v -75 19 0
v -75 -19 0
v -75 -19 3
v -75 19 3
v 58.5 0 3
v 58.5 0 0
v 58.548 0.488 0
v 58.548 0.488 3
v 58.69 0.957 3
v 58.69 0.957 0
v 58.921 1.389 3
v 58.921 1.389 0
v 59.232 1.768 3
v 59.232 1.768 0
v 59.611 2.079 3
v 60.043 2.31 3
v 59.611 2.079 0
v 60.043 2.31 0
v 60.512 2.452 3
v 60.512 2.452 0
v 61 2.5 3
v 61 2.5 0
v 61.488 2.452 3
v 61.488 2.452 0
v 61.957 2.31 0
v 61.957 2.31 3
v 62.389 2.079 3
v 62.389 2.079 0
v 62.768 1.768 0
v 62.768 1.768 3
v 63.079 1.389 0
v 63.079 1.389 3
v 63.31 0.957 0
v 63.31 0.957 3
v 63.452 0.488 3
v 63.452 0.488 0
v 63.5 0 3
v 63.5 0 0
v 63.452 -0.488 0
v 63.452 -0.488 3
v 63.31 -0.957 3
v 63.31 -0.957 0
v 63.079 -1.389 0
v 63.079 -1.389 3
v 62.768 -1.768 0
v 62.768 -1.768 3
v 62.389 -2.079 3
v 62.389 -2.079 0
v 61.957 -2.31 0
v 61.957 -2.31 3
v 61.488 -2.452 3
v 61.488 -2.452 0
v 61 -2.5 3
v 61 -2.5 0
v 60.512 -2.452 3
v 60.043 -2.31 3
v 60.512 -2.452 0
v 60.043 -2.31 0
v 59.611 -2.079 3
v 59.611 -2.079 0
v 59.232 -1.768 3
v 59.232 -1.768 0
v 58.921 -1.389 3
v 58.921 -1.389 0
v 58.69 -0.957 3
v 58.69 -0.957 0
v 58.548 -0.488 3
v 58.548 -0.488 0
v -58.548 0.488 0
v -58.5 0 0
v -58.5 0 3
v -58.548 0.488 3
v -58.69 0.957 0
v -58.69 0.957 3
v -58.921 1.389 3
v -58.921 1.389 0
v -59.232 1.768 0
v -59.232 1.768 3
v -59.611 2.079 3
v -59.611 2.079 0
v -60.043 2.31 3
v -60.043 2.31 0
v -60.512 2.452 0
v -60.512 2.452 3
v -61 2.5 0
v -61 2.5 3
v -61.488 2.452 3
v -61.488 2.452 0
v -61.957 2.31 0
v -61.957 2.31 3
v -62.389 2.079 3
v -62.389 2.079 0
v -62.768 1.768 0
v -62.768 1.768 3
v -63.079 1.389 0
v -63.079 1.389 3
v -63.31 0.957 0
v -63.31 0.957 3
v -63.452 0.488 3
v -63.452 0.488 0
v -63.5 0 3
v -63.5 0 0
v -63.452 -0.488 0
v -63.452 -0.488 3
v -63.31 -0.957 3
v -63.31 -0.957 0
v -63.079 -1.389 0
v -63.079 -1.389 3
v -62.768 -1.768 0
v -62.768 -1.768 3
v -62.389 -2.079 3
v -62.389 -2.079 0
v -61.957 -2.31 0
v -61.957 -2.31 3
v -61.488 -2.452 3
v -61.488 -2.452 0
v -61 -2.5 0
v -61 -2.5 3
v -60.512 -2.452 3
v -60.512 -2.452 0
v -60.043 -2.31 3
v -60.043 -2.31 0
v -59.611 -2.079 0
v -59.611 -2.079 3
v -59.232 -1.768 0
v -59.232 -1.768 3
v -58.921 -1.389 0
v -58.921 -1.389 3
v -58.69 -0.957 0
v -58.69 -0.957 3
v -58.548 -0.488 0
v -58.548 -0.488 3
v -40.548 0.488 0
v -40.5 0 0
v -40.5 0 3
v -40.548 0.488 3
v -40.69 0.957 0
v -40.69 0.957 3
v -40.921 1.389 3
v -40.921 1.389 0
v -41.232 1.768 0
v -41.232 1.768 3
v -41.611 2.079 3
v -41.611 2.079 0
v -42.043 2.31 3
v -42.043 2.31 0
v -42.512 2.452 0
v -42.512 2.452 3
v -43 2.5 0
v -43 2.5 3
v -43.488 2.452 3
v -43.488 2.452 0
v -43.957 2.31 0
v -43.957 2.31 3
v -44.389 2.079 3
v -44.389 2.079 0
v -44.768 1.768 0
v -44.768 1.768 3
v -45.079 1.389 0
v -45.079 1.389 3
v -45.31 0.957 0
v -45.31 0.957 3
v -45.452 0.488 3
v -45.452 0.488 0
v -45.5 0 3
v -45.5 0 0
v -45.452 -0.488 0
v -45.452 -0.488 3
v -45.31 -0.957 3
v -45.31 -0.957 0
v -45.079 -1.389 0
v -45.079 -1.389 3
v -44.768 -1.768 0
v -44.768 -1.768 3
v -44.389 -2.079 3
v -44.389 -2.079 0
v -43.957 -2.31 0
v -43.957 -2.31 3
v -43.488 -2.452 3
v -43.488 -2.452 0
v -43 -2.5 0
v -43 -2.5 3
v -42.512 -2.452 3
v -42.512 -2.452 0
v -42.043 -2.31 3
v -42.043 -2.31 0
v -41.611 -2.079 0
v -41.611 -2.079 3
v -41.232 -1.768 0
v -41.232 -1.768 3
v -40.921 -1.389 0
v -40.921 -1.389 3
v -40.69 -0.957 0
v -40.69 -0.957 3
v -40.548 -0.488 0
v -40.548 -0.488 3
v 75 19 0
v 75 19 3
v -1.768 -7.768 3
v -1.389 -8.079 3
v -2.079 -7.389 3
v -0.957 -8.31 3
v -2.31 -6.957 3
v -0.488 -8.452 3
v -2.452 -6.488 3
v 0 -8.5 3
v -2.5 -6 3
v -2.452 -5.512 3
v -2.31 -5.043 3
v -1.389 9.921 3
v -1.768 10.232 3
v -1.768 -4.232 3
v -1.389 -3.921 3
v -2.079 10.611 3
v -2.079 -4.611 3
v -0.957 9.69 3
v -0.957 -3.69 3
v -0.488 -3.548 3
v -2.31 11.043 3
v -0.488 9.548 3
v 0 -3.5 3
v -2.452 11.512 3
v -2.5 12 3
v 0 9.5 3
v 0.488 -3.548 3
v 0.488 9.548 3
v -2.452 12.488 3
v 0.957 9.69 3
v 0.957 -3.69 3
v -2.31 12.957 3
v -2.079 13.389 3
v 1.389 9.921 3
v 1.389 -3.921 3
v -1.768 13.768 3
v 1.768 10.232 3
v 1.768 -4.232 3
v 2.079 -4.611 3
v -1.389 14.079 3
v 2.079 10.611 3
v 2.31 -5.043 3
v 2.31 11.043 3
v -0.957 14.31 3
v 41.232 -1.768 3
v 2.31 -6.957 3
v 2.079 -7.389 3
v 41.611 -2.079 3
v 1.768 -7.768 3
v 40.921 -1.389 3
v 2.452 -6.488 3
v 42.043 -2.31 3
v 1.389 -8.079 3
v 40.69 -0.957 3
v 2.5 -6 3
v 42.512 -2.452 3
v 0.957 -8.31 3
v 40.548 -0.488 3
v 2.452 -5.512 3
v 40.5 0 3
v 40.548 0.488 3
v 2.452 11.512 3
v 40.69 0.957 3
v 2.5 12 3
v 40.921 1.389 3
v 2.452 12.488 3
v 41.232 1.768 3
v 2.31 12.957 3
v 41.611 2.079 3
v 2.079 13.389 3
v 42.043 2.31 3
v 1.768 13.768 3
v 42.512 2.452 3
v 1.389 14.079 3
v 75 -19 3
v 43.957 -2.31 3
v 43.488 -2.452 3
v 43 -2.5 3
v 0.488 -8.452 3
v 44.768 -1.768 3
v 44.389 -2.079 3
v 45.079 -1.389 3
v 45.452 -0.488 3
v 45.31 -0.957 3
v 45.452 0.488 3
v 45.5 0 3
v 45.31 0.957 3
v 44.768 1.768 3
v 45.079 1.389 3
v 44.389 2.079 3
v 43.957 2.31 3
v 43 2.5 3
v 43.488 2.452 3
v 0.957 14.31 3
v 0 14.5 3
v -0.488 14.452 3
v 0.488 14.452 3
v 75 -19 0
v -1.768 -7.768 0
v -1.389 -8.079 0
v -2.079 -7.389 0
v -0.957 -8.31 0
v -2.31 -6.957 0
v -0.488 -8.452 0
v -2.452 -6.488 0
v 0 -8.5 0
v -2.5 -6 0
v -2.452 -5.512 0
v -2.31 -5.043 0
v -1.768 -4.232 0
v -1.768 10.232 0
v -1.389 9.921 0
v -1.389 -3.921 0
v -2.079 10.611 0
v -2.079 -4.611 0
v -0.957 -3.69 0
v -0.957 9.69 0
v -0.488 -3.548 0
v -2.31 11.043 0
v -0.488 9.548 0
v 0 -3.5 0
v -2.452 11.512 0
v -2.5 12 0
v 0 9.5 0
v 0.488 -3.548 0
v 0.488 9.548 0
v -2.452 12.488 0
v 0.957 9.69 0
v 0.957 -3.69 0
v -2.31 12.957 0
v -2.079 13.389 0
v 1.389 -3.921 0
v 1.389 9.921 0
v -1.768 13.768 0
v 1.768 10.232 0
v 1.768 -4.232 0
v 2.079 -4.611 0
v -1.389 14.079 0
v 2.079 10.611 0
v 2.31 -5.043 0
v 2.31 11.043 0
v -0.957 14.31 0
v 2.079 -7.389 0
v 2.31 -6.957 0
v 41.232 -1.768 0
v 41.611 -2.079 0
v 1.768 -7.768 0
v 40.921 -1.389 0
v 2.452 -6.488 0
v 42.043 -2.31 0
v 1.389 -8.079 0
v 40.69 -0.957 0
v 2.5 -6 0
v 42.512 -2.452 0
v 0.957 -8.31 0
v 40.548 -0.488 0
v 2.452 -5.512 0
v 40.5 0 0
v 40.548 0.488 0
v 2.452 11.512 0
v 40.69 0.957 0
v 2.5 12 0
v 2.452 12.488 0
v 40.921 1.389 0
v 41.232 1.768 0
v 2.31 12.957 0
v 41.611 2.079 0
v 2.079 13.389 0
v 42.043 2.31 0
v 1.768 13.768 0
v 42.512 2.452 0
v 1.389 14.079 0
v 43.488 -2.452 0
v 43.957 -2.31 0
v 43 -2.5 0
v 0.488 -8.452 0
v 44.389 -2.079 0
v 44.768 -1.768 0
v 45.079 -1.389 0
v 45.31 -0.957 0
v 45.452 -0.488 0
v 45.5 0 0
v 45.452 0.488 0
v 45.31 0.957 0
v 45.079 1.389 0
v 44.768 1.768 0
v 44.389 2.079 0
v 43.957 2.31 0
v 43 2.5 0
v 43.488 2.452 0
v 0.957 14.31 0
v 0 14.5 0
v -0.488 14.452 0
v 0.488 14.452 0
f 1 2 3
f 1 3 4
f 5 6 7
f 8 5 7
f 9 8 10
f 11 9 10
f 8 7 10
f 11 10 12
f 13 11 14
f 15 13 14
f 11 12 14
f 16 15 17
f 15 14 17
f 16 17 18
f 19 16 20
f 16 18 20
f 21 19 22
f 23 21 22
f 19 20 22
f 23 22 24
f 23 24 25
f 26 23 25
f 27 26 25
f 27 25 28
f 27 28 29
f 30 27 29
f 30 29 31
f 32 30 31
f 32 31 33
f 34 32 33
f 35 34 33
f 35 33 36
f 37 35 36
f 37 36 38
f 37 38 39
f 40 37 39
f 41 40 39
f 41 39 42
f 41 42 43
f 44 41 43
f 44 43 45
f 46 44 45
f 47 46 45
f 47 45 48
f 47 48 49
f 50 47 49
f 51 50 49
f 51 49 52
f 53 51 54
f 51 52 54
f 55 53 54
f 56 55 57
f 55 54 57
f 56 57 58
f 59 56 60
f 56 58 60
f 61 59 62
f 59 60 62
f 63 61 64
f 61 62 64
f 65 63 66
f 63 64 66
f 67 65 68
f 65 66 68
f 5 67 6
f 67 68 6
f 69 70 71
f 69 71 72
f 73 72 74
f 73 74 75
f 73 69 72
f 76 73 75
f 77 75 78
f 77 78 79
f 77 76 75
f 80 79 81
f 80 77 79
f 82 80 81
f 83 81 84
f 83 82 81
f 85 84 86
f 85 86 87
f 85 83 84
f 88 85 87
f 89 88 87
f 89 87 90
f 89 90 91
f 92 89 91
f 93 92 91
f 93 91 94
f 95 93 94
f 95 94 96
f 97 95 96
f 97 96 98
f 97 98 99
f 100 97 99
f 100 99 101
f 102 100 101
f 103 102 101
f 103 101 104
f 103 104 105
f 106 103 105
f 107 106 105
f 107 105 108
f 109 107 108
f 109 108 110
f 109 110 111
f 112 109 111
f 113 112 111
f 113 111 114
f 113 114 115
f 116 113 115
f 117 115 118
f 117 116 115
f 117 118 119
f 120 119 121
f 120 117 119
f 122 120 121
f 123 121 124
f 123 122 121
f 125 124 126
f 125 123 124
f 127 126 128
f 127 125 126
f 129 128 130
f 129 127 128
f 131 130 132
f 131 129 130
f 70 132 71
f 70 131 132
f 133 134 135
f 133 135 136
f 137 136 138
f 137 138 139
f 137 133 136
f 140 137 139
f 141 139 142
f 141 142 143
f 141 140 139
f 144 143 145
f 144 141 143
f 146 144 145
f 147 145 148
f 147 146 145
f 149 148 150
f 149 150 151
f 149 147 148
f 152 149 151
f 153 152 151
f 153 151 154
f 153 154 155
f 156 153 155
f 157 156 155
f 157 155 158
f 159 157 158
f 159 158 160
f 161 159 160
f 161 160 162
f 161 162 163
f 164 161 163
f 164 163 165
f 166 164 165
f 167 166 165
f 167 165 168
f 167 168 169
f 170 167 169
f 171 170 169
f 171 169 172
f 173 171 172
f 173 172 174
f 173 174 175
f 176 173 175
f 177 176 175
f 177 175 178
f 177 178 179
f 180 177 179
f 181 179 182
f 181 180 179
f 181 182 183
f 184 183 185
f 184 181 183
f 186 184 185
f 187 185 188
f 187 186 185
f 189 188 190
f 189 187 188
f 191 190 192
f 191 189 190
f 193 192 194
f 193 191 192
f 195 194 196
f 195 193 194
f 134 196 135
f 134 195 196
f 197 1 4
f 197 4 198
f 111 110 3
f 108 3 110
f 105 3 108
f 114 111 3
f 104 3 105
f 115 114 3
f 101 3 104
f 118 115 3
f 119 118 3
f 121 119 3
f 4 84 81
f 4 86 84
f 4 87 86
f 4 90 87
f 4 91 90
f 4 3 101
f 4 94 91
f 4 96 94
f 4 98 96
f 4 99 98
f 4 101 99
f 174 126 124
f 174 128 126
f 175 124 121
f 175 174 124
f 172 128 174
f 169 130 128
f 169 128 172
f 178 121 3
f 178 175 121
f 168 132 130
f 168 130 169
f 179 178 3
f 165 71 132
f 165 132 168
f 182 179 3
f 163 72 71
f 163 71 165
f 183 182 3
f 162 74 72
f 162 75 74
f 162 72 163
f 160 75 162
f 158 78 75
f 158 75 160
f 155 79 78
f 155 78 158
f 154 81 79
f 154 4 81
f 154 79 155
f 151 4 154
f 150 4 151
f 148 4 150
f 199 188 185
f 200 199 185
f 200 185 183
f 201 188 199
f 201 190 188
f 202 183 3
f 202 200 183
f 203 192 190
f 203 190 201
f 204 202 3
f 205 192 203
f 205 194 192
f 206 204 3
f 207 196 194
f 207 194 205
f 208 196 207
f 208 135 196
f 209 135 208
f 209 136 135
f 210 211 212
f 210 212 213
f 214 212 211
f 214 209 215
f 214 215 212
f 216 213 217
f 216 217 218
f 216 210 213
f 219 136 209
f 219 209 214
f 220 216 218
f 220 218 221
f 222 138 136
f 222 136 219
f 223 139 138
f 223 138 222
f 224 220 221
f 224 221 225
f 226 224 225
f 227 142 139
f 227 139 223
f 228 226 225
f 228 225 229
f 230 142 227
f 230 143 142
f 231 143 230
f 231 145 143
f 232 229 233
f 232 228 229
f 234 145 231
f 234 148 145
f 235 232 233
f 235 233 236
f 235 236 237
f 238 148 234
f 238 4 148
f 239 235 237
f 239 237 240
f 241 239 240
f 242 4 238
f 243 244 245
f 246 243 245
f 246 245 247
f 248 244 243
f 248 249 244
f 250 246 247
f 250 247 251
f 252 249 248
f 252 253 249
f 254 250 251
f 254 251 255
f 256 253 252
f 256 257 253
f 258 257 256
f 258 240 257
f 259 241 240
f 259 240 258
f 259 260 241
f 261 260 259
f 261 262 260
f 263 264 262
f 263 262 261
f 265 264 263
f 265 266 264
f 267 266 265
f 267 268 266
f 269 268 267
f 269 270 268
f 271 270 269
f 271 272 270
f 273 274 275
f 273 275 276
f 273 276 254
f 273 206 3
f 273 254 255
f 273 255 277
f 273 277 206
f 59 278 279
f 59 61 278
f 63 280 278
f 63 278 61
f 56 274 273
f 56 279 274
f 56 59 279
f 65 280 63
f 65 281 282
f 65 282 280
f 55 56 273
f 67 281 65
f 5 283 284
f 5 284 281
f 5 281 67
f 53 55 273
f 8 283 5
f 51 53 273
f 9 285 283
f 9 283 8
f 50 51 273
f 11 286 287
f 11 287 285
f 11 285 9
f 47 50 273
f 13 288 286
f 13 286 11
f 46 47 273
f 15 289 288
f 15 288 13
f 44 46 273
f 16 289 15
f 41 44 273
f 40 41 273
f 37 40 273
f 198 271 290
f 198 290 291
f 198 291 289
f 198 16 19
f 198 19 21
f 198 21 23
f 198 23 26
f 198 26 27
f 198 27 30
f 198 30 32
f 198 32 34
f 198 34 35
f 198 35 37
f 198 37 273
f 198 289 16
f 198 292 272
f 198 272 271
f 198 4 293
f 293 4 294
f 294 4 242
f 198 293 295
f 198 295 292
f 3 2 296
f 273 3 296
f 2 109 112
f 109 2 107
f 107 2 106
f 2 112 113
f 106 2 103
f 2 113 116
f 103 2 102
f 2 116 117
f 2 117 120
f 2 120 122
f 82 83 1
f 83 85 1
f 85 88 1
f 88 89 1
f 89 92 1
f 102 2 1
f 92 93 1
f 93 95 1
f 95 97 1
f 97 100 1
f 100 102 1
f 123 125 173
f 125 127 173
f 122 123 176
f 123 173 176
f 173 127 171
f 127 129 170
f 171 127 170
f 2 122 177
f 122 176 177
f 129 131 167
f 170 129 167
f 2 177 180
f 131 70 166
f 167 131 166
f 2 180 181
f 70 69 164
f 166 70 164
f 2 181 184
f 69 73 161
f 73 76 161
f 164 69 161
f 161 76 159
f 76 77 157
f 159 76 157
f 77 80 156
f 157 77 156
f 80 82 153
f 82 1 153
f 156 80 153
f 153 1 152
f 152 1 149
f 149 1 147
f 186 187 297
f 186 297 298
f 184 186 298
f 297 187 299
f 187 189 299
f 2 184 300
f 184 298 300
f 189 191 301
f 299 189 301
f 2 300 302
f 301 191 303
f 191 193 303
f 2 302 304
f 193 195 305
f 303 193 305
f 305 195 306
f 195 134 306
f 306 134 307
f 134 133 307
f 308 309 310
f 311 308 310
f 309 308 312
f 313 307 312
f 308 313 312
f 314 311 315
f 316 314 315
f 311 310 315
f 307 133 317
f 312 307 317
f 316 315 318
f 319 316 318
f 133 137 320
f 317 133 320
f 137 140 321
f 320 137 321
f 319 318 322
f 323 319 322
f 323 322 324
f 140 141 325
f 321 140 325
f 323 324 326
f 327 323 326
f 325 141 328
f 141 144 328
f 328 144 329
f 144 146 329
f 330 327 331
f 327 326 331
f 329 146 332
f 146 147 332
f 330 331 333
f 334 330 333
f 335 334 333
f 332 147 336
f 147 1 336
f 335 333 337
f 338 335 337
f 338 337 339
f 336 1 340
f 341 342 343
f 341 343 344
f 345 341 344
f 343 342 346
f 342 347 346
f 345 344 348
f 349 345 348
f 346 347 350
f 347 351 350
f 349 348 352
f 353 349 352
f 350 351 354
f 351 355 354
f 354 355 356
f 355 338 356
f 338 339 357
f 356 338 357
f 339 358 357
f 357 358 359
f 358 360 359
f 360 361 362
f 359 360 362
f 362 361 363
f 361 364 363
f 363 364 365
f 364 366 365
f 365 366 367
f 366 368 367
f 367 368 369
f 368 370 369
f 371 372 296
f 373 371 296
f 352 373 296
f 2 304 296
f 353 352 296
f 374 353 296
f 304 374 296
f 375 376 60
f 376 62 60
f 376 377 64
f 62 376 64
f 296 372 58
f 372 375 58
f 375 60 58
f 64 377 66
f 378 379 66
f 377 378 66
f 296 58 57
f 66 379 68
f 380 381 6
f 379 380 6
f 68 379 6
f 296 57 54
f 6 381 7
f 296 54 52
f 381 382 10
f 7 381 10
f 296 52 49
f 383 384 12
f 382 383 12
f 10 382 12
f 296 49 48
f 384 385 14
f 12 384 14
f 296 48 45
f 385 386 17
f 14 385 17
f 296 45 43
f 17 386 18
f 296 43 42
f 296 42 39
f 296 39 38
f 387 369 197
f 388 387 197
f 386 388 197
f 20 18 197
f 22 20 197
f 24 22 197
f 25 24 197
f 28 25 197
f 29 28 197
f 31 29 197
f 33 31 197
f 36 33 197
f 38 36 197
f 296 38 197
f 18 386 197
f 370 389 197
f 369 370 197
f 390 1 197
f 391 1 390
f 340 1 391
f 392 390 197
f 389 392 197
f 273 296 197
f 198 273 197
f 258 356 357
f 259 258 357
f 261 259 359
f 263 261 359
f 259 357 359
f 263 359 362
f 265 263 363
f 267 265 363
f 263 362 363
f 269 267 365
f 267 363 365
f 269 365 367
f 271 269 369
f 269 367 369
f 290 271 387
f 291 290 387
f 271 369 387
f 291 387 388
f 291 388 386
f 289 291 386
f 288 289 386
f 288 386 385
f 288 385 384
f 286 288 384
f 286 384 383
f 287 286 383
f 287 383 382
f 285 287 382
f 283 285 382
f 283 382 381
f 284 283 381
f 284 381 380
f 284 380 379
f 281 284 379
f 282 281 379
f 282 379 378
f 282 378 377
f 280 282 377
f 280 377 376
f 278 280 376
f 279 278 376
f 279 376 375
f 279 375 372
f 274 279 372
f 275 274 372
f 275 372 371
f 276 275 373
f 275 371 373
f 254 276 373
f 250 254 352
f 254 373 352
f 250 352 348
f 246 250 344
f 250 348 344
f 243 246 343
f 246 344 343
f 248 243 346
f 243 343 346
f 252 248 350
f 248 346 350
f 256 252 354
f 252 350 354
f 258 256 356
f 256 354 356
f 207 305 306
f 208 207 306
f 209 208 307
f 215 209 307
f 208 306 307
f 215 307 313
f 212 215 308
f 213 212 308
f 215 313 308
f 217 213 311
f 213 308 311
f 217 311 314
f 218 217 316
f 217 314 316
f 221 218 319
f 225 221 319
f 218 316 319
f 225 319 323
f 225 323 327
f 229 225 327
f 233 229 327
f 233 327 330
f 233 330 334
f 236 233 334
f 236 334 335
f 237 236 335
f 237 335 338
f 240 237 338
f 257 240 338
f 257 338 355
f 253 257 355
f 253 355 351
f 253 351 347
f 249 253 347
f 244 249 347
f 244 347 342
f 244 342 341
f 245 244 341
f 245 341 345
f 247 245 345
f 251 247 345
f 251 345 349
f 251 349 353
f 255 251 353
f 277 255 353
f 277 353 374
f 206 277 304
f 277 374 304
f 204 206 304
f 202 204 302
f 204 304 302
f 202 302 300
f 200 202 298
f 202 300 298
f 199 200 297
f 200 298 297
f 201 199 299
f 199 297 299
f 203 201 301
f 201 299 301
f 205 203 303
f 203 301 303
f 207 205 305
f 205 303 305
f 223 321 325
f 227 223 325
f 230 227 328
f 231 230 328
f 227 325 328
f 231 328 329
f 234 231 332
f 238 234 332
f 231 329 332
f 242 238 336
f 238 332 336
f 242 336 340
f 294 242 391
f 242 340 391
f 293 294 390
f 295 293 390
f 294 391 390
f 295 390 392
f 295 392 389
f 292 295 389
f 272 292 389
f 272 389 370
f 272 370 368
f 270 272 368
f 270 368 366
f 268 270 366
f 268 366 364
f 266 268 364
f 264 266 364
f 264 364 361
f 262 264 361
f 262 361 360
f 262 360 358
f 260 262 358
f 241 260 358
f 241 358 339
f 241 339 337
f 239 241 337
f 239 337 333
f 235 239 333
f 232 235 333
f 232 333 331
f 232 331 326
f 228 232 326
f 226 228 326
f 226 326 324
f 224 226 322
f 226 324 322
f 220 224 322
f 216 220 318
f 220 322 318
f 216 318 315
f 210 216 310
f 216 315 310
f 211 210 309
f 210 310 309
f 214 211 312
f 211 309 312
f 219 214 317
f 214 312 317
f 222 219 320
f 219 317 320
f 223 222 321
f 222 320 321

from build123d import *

# Parameters (mm, degrees)
SKETCH_1_W          = 150
SKETCH_1_H          = 38
EXTRUDE_1_DEPTH     = 3
CUT_EXTRUDE_1_REACH = 79.427
SKETCH_2_R          = 2.5
CUT_EXTRUDE_2_REACH = 79.427
SKETCH_4_R          = 2.5


with BuildPart() as part:
    # 草圖1 → 填料-伸長1 (new body)
    with BuildSketch(Plane.XY):
        Rectangle(SKETCH_1_W, SKETCH_1_H)
    extrude(amount=EXTRUDE_1_DEPTH)

    # 草圖2 → 除料-伸長1 (cut, up to next)
    with BuildSketch(Plane(origin=(0, 0, 0), x_dir=(-1, 0, 0), z_dir=(0, 0, -1)), mode=Mode.PRIVATE) as cut_extrude_1_sk1:
        with Locations((-61, 0)):
            Circle(SKETCH_2_R)
    cut_extrude_1_tool1 = extrude(cut_extrude_1_sk1.sketch, amount=-CUT_EXTRUDE_1_REACH, mode=Mode.PRIVATE) & part.part
    # 草圖2 → 除料-伸長1 (cut, up to next)
    with BuildSketch(Plane(origin=(0, 0, 0), x_dir=(-1, 0, 0), z_dir=(0, 0, -1)), mode=Mode.PRIVATE) as cut_extrude_1_sk2:
        with Locations((-43, 0)):
            Circle(SKETCH_2_R)
    cut_extrude_1_tool2 = extrude(cut_extrude_1_sk2.sketch, amount=-CUT_EXTRUDE_1_REACH, mode=Mode.PRIVATE) & part.part
    cut_extrude_1_1 = cut_extrude_1_tool1.solids().sort_by_distance((61, 0, 0))[0]
    add(cut_extrude_1_1, mode=Mode.SUBTRACT)
    cut_extrude_1_2 = cut_extrude_1_tool2.solids().sort_by_distance((43, 0, 0))[0]
    add(cut_extrude_1_2, mode=Mode.SUBTRACT)
    cut_extrude_1 = cut_extrude_1_1 + cut_extrude_1_2  # 除料-伸長1 as one shape, for the pattern or mirror that repeats it

    # 鏡射1: 除料-伸長1 across plane
    add(cut_extrude_1.mirror(Plane(origin=(0, 0, 0), x_dir=(0, 0, 1), z_dir=(1, 0, 0))), mode=Mode.SUBTRACT)

    # 草圖4 → 除料-伸長2 (cut, up to next)
    with BuildSketch(Plane(origin=(0, 0, 0), x_dir=(-1, 0, 0), z_dir=(0, 0, -1)), mode=Mode.PRIVATE) as cut_extrude_2_sk1:
        with Locations((0, -6)):
            Circle(SKETCH_4_R)
    cut_extrude_2_tool1 = extrude(cut_extrude_2_sk1.sketch, amount=-CUT_EXTRUDE_2_REACH, mode=Mode.PRIVATE) & part.part
    # 草圖4 → 除料-伸長2 (cut, up to next)
    with BuildSketch(Plane(origin=(0, 0, 0), x_dir=(-1, 0, 0), z_dir=(0, 0, -1)), mode=Mode.PRIVATE) as cut_extrude_2_sk2:
        with Locations((0, 12)):
            Circle(SKETCH_4_R)
    cut_extrude_2_tool2 = extrude(cut_extrude_2_sk2.sketch, amount=-CUT_EXTRUDE_2_REACH, mode=Mode.PRIVATE) & part.part
    add(cut_extrude_2_tool1.solids().sort_by_distance((0, -6, 0))[0], mode=Mode.SUBTRACT)
    add(cut_extrude_2_tool2.solids().sort_by_distance((0, 12, 0))[0], mode=Mode.SUBTRACT)


solid = part.part
